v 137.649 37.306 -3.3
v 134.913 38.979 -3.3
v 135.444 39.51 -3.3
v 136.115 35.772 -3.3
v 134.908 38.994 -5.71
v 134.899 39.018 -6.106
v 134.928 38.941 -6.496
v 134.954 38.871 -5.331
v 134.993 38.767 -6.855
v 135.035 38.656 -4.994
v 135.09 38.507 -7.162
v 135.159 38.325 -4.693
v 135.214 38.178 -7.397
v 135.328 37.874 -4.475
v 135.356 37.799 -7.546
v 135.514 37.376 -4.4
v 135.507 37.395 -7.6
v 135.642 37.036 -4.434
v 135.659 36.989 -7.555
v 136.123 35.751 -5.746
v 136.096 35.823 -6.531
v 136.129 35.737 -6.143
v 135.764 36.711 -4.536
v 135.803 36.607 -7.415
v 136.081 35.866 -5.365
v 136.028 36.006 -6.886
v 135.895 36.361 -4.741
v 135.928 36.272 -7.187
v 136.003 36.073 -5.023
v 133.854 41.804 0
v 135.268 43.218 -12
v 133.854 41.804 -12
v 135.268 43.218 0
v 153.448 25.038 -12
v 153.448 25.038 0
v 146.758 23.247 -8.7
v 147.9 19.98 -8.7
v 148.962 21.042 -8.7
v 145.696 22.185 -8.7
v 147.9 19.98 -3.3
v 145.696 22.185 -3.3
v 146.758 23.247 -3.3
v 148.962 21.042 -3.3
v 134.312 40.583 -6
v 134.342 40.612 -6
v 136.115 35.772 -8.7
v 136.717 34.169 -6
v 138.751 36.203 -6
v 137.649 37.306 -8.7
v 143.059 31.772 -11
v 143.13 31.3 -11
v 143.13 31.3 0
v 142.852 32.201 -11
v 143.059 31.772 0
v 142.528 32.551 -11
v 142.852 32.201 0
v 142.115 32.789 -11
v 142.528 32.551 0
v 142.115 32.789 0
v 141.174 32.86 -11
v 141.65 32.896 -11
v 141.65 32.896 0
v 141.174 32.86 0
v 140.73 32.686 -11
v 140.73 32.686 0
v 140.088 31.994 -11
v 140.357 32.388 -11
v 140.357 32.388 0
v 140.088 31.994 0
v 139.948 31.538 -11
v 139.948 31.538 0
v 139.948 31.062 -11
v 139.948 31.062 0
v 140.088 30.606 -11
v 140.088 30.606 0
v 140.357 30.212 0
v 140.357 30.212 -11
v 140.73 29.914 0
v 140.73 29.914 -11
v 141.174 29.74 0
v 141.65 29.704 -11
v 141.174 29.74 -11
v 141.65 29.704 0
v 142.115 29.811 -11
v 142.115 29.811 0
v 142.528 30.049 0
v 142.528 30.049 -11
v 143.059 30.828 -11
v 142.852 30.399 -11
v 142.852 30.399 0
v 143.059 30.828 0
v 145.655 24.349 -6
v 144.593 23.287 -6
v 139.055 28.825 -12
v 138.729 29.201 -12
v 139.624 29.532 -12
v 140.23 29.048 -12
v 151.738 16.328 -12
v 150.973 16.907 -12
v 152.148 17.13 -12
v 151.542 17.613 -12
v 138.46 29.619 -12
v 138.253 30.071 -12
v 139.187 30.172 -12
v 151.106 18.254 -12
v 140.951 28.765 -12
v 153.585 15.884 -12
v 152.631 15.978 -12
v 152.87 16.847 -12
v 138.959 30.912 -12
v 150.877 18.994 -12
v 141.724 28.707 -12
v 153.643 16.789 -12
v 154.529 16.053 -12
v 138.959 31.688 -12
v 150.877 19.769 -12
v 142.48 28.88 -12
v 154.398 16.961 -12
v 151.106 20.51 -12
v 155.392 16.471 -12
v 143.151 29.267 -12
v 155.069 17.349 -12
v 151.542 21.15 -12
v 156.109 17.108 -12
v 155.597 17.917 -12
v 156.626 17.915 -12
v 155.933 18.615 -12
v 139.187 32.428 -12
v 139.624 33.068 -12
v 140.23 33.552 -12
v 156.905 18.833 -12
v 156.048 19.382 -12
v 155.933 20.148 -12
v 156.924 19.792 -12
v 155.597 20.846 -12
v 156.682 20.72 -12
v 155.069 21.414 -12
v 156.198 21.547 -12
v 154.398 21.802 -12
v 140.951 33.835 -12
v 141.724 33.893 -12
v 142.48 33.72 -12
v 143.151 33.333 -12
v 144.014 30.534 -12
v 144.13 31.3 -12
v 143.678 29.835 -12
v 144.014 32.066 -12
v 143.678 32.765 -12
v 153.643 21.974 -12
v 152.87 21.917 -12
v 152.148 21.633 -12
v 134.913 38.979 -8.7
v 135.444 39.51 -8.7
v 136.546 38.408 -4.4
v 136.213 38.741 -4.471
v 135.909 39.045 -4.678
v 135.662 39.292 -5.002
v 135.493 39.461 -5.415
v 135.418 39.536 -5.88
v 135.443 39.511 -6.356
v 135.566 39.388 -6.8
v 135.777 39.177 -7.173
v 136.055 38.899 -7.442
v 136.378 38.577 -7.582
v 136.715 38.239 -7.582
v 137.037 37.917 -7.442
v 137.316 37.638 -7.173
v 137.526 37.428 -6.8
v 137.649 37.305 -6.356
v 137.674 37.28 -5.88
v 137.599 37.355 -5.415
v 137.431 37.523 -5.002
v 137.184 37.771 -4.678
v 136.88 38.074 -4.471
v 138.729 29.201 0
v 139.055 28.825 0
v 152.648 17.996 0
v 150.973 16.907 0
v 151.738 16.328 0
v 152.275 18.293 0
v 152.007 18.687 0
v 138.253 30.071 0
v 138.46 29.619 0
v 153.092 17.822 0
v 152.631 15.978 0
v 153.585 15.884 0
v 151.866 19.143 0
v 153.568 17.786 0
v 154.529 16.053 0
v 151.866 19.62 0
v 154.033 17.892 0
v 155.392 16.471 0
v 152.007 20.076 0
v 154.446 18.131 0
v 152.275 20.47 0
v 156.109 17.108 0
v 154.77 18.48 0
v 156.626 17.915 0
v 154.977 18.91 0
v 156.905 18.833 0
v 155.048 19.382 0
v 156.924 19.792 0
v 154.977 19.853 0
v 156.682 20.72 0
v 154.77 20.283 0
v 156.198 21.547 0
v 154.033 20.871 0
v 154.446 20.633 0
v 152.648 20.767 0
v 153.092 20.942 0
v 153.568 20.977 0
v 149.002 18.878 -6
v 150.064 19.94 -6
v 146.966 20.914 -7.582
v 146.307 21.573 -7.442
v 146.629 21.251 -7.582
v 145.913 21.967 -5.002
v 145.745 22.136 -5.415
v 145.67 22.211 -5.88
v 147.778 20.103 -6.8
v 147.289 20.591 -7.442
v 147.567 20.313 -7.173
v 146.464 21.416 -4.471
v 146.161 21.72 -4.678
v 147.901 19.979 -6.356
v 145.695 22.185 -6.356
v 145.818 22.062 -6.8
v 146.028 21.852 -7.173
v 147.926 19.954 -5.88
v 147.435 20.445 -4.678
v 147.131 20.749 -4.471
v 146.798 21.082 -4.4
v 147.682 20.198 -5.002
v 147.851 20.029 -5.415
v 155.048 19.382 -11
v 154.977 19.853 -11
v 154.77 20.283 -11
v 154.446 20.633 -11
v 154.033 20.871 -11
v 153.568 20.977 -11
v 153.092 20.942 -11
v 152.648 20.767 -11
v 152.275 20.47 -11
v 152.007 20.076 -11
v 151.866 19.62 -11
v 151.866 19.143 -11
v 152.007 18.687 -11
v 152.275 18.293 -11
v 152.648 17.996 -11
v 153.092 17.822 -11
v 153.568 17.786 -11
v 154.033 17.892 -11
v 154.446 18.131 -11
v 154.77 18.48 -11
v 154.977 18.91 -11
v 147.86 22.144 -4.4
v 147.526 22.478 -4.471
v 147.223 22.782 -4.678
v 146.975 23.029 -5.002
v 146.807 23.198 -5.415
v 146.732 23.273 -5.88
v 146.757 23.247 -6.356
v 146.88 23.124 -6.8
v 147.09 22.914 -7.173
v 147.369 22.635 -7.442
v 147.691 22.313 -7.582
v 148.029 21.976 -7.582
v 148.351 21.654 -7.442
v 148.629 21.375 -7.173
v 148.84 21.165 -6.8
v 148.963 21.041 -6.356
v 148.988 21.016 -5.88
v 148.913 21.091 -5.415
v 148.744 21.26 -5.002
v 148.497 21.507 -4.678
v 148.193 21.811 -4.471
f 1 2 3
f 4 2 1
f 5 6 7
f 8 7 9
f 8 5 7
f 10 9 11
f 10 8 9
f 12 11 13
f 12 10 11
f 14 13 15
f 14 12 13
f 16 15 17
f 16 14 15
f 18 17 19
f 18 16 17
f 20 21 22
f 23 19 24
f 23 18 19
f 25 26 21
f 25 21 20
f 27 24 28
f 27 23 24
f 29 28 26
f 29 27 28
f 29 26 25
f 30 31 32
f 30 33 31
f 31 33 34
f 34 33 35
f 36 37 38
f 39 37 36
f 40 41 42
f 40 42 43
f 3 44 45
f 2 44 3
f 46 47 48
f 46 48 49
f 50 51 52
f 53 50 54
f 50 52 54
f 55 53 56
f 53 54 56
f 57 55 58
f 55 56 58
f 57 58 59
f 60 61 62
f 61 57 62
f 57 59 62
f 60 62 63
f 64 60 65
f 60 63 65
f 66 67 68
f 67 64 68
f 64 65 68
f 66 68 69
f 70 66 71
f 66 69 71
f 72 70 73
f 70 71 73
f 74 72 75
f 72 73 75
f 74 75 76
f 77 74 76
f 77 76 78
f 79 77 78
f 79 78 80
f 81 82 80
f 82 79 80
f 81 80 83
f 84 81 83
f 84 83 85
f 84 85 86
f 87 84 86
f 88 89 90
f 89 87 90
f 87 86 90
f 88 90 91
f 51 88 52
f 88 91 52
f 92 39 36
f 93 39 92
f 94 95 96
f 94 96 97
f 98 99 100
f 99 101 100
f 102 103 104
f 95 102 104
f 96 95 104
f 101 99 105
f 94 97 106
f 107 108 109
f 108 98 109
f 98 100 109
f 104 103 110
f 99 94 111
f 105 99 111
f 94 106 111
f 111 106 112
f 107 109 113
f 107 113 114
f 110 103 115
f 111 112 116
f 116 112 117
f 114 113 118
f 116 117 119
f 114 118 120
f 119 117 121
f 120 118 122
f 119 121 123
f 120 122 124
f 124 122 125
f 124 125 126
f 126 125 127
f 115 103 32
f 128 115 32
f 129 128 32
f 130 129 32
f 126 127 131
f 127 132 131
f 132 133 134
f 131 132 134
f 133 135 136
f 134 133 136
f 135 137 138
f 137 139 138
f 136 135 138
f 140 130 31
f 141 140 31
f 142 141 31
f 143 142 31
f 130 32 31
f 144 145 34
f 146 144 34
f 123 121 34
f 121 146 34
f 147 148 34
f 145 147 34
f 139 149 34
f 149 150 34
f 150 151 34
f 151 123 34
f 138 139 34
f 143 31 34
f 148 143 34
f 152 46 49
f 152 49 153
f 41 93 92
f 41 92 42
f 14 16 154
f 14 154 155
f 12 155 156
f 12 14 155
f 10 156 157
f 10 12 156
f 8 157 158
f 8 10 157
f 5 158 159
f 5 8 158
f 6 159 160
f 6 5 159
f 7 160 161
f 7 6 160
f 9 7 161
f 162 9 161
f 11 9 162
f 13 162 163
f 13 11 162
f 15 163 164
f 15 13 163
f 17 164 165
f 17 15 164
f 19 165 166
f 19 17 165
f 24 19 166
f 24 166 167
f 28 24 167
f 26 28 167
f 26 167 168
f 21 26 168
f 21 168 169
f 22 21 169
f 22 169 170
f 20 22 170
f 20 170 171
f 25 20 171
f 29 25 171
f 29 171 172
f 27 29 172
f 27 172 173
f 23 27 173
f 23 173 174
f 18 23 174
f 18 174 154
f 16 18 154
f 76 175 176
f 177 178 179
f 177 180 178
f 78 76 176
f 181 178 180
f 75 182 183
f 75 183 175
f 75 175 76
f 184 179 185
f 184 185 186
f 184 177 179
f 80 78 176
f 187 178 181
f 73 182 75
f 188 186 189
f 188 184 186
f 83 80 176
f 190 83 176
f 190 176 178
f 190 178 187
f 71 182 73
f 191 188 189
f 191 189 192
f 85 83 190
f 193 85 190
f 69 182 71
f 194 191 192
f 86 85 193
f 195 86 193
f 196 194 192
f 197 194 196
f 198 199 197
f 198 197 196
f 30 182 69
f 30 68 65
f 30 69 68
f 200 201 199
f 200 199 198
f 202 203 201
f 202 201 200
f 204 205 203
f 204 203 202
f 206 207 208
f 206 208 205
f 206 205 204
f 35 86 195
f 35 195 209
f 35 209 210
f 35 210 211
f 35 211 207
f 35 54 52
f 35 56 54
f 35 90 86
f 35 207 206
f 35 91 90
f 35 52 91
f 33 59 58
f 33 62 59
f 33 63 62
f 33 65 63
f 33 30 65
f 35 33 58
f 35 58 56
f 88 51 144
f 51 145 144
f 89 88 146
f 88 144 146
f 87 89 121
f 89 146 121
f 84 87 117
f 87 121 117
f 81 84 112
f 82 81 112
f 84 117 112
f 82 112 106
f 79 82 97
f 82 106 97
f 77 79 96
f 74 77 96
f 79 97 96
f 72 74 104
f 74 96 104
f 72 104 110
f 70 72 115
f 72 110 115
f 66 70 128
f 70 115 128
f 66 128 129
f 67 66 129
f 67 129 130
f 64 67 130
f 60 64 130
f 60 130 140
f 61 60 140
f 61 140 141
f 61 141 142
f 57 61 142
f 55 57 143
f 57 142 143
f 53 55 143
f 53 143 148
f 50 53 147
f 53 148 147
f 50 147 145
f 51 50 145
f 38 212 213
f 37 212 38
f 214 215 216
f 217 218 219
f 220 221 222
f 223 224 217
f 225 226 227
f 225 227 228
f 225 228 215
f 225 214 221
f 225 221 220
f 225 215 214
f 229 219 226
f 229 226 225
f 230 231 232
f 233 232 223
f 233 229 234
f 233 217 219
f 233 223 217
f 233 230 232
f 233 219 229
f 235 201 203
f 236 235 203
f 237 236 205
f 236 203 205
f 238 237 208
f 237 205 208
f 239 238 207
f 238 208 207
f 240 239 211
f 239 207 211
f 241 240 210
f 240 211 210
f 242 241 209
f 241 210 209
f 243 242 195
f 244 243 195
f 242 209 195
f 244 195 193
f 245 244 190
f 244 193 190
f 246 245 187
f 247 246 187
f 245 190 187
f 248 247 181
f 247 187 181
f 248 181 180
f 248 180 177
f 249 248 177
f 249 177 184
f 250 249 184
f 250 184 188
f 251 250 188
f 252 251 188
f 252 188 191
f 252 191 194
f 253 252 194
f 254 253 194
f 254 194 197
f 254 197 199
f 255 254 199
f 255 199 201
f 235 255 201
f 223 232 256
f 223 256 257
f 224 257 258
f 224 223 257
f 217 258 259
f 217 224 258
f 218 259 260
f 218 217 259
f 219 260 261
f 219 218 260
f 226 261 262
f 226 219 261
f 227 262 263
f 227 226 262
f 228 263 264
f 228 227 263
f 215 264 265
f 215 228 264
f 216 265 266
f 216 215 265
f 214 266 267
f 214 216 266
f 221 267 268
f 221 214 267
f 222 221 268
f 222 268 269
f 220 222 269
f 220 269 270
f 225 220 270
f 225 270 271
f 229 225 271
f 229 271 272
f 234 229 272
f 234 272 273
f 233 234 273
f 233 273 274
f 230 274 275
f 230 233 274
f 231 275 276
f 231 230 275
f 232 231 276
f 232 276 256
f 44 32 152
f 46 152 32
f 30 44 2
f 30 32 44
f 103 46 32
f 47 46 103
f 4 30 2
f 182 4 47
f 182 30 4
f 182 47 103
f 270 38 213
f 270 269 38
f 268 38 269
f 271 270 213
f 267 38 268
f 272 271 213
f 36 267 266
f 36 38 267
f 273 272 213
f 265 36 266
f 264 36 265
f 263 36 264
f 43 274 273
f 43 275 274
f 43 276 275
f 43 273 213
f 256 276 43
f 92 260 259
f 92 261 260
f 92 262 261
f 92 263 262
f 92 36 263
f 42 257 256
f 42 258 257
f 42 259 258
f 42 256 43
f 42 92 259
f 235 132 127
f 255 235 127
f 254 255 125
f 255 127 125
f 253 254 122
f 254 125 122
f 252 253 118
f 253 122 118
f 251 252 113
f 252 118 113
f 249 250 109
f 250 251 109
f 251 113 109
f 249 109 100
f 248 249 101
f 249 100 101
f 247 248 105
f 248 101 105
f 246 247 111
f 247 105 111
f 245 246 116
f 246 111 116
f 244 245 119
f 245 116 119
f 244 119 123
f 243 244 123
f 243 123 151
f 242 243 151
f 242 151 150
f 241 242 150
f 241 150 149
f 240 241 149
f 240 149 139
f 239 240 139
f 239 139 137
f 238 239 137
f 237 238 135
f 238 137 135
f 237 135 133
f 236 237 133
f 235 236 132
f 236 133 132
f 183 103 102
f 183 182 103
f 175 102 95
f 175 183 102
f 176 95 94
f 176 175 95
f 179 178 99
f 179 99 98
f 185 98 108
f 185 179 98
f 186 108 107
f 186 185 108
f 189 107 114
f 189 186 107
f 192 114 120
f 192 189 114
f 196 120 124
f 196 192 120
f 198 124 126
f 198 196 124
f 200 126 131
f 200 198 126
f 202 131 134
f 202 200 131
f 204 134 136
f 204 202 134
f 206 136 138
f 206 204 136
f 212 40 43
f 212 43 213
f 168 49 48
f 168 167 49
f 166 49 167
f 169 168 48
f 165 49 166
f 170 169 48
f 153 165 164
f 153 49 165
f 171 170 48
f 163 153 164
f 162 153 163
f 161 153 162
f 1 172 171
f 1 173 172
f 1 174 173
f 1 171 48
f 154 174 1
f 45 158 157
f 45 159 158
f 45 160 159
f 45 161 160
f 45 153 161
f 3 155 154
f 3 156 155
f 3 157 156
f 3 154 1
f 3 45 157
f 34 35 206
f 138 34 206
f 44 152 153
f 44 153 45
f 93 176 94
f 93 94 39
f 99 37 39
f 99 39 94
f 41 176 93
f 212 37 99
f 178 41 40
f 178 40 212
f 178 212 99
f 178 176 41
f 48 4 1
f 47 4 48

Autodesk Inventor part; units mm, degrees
ref_plane "YZ Plane" through (0, 0, 0) normal (1, 0, 0) x (0, 1, 0)
ref_plane "XZ Plane" through (0, 0, 0) normal (0, 1, 0) x (-1, 0, 0)
ref_plane "XY Plane" through (0, 0, 0) normal (0, 0, 1) x (1, 0, 0)
sketch "Эскиз1" plane through (0, 0, 0) normal (0, 0, 1) x (1, 0, 0)
  line L0 (-5, -1.0438) -> (49.0851, -1.0438) projected
  circle A0 centre (141.53, 31.3) radius 1.6
  circle A1 centre (141.53, 31.3) radius 12.8551
  line L1 (141.53, 31.3) -> (144.3584, 34.1284)
  line L2 (144.3584, 34.1284) -> (153.4483, 25.0385)
  line L3 (144.3584, 34.1284) -> (135.2685, 43.2183)
  line L4 (135.2685, 43.2183) -> (132.4401, 40.3899)
  line L5 (133.8543, 41.8041) -> (152.0341, 23.6243)
  line L6 (152.0341, 23.6243) -> (153.4483, 25.0385)
  circle A2 centre (141.53, 31.3) radius 3.5
  line L7 (133.8543, 41.8041) -> (138.2527, 30.0714)
  line L8 (141.53, 31.3) -> (150.6199, 22.2101)
  line L9 (150.6199, 22.2101) -> (153.4483, 19.3817)
  circle A3 centre (153.4483, 19.3817) radius 1.6
  circle A4 centre (153.4483, 19.3817) radius 3.5
  line L10 (139.0551, 28.8251) -> (150.9734, 16.9068)
  line L11 (153.4483, 25.0385) -> (156.198, 21.5472)
  ellipse E0 centre (50.75, 20.1064) end of major axis (50.75, -5.3184) minor radius 3 (49.0851, -1.0438) -> (50.4608, -5.2) ccw projected
  line L12 (-5, -9.3562) -> (-5, -1.0438) projected
  line L13 (49.0851, -9.3562) -> (-5, -9.3562) projected
  ellipse E1 centre (50.75, -30.5064) end of major axis (50.75, -5.0816) minor radius 3 (50.4608, -5.2) -> (49.0851, -9.3562) ccw projected
  line L14 (135.2688, -53.6185) -> (153.4482, -35.4383) projected
  line L15 (153.4482, -35.4383) -> (156.1979, -31.9467) projected
  arc A5 (156.1979, -31.9467) -> (150.9733, -27.3065) centre (153.4482, -29.7813) ccw projected
  line L16 (150.9733, -27.3065) -> (139.0551, -39.2252) projected
  arc A6 (139.0551, -39.2252) -> (138.2526, -40.4715) centre (141.5299, -41.7001) ccw projected
  line L17 (138.2526, -40.4715) -> (133.8546, -52.2043) projected
  line L18 (133.8546, -52.2043) -> (135.2688, -53.6185) projected
  circle A7 centre (153.4482, -29.7813) radius 1.6 projected
  circle A8 centre (141.5299, -41.7001) radius 1.6 projected
  arc A9 (133.5218, -22.9864) -> (138.03, -21.6481) centre (141.53, -41.7) ccw projected
  arc A10 (138.03, -25.2121) -> (137.4201, -25.3535) centre (141.5299, -41.7001) ccw projected
  line L19 (137.4201, -25.3535) -> (133.5218, -22.9864) projected
  line L20 (138.03, -21.6481) -> (138.03, -25.2121) projected
  point P0 (0, 0)
  point P1 (139.0604, -39.2199)
  point P2 (144.9752, 30.6832)
  point P3 (140.9132, 34.7452)
  point P4 (133.9107, 41.6537)
  point P5 (135.7198, 42.7671)
  dimension "d0" = 3.2
  dimension "d1" = 4
  dimension "d2" = 7
  dimension "d3" = 4
  dimension "d4" = 3.2
  dimension "d5" = 7
extrude "Выдавливание1" add sketch "Эскиз1" against normal blind 12 contours A0 L1 L5 A2 L8 | A0 L8 A2 L5 L1 | L5 A2 L1 | L1 A2 L5 | L8 A1 L10 A2 | A2 L5 A1 L8 | A2 L5 A1 L3 L1 | L1 L2 A1 L5 A2 | A2 L7 A1 L5 | L9 A4 L10 A1 | A1 L5 L6 L11 A4 L9 | L5 L4 L3 A1 | A1 L7 L5 | A1 L2 L6 L5 | A4
chamfer "Фаска1" distance 1 angle 45 2 edges at (151.8483, 19.3817, -12) (139.93, 31.3, -12)
sketch "Эскиз2" plane through (153.4483, 25.0385, 0) normal (0.7071068, 0.7071068, 0) x (0, 0, -1)
  line L0 (0, 25.7101) -> (12, 25.7101) projected
  line L1 (6, 25.7101) -> (6, 21.4051)
  line L2 (6, 21.4051) -> (6, -7.5)
  line L3 (0, -7.5) -> (12, -7.5) projected
  line L4 (6, 21.4051) -> (6, 1.9051)
  circle A0 centre (6, 21.4051) radius 1.6
  circle A1 centre (6, 1.9051) radius 1.6
  point P0 (0, 90.7994)
  dimension "d11" = 4.305
  dimension "d12" = 19.5
  dimension "d13" = 3.2
  dimension "d14" = 3.2
extrude "Выдавливание2" [suppressed]
chamfer "Фаска2" [suppressed]
sketch "Эскиз3" plane through (139.0551, 28.8251, -12) normal (-0.7071068, -0.7071068, 0) x (0, 0, 1)
  circle A0 centre (6, -10.9499) radius 1.6 projected
  line L0 (6, -10.9499) -> (8.7, -10.9499)
  line L1 (8.7, -12.5088) -> (6, -14.0676)
  line L2 (6, -14.0676) -> (3.3, -12.5088)
  line L3 (3.3, -12.5088) -> (3.3, -9.3911)
  line L4 (3.3, -9.3911) -> (6, -7.8323)
  line L5 (6, -7.8323) -> (8.7, -9.3911)
  line L6 (8.7, -9.3911) -> (8.7, -12.5088)
  point P0 (12, 77.9444)
  dimension "d20" = 2.7
extrude "Выдавливание3" cut sketch "Эскиз3" against normal blind 1.5
sketch "Эскиз4" plane through (139.0551, 28.8251, -12) normal (-0.7071068, -0.7071068, 0) x (0, 0, 1)
  circle A0 centre (6, 8.5501) radius 1.6 projected
  line L0 (6, 8.5501) -> (8.7, 8.5501)
  line L1 (12, -12.8551) -> (12, 12.2169) projected
  line L2 (8.7, 6.9912) -> (6, 5.4324)
  line L3 (6, 5.4324) -> (3.3, 6.9912)
  line L4 (3.3, 6.9912) -> (3.3, 10.1089)
  line L5 (3.3, 10.1089) -> (6, 11.6677)
  line L6 (6, 11.6677) -> (8.7, 10.1089)
  line L7 (8.7, 10.1089) -> (8.7, 6.9912)
  point P0 (12, 77.9444)
  point P1 (12, 12.8551)
  point P2 (6, 8.5501)
  dimension "d23" = 2.7
extrude "Выдавливание4" cut sketch "Эскиз4" against normal blind 5
properties part number "laser_krepl_right"
